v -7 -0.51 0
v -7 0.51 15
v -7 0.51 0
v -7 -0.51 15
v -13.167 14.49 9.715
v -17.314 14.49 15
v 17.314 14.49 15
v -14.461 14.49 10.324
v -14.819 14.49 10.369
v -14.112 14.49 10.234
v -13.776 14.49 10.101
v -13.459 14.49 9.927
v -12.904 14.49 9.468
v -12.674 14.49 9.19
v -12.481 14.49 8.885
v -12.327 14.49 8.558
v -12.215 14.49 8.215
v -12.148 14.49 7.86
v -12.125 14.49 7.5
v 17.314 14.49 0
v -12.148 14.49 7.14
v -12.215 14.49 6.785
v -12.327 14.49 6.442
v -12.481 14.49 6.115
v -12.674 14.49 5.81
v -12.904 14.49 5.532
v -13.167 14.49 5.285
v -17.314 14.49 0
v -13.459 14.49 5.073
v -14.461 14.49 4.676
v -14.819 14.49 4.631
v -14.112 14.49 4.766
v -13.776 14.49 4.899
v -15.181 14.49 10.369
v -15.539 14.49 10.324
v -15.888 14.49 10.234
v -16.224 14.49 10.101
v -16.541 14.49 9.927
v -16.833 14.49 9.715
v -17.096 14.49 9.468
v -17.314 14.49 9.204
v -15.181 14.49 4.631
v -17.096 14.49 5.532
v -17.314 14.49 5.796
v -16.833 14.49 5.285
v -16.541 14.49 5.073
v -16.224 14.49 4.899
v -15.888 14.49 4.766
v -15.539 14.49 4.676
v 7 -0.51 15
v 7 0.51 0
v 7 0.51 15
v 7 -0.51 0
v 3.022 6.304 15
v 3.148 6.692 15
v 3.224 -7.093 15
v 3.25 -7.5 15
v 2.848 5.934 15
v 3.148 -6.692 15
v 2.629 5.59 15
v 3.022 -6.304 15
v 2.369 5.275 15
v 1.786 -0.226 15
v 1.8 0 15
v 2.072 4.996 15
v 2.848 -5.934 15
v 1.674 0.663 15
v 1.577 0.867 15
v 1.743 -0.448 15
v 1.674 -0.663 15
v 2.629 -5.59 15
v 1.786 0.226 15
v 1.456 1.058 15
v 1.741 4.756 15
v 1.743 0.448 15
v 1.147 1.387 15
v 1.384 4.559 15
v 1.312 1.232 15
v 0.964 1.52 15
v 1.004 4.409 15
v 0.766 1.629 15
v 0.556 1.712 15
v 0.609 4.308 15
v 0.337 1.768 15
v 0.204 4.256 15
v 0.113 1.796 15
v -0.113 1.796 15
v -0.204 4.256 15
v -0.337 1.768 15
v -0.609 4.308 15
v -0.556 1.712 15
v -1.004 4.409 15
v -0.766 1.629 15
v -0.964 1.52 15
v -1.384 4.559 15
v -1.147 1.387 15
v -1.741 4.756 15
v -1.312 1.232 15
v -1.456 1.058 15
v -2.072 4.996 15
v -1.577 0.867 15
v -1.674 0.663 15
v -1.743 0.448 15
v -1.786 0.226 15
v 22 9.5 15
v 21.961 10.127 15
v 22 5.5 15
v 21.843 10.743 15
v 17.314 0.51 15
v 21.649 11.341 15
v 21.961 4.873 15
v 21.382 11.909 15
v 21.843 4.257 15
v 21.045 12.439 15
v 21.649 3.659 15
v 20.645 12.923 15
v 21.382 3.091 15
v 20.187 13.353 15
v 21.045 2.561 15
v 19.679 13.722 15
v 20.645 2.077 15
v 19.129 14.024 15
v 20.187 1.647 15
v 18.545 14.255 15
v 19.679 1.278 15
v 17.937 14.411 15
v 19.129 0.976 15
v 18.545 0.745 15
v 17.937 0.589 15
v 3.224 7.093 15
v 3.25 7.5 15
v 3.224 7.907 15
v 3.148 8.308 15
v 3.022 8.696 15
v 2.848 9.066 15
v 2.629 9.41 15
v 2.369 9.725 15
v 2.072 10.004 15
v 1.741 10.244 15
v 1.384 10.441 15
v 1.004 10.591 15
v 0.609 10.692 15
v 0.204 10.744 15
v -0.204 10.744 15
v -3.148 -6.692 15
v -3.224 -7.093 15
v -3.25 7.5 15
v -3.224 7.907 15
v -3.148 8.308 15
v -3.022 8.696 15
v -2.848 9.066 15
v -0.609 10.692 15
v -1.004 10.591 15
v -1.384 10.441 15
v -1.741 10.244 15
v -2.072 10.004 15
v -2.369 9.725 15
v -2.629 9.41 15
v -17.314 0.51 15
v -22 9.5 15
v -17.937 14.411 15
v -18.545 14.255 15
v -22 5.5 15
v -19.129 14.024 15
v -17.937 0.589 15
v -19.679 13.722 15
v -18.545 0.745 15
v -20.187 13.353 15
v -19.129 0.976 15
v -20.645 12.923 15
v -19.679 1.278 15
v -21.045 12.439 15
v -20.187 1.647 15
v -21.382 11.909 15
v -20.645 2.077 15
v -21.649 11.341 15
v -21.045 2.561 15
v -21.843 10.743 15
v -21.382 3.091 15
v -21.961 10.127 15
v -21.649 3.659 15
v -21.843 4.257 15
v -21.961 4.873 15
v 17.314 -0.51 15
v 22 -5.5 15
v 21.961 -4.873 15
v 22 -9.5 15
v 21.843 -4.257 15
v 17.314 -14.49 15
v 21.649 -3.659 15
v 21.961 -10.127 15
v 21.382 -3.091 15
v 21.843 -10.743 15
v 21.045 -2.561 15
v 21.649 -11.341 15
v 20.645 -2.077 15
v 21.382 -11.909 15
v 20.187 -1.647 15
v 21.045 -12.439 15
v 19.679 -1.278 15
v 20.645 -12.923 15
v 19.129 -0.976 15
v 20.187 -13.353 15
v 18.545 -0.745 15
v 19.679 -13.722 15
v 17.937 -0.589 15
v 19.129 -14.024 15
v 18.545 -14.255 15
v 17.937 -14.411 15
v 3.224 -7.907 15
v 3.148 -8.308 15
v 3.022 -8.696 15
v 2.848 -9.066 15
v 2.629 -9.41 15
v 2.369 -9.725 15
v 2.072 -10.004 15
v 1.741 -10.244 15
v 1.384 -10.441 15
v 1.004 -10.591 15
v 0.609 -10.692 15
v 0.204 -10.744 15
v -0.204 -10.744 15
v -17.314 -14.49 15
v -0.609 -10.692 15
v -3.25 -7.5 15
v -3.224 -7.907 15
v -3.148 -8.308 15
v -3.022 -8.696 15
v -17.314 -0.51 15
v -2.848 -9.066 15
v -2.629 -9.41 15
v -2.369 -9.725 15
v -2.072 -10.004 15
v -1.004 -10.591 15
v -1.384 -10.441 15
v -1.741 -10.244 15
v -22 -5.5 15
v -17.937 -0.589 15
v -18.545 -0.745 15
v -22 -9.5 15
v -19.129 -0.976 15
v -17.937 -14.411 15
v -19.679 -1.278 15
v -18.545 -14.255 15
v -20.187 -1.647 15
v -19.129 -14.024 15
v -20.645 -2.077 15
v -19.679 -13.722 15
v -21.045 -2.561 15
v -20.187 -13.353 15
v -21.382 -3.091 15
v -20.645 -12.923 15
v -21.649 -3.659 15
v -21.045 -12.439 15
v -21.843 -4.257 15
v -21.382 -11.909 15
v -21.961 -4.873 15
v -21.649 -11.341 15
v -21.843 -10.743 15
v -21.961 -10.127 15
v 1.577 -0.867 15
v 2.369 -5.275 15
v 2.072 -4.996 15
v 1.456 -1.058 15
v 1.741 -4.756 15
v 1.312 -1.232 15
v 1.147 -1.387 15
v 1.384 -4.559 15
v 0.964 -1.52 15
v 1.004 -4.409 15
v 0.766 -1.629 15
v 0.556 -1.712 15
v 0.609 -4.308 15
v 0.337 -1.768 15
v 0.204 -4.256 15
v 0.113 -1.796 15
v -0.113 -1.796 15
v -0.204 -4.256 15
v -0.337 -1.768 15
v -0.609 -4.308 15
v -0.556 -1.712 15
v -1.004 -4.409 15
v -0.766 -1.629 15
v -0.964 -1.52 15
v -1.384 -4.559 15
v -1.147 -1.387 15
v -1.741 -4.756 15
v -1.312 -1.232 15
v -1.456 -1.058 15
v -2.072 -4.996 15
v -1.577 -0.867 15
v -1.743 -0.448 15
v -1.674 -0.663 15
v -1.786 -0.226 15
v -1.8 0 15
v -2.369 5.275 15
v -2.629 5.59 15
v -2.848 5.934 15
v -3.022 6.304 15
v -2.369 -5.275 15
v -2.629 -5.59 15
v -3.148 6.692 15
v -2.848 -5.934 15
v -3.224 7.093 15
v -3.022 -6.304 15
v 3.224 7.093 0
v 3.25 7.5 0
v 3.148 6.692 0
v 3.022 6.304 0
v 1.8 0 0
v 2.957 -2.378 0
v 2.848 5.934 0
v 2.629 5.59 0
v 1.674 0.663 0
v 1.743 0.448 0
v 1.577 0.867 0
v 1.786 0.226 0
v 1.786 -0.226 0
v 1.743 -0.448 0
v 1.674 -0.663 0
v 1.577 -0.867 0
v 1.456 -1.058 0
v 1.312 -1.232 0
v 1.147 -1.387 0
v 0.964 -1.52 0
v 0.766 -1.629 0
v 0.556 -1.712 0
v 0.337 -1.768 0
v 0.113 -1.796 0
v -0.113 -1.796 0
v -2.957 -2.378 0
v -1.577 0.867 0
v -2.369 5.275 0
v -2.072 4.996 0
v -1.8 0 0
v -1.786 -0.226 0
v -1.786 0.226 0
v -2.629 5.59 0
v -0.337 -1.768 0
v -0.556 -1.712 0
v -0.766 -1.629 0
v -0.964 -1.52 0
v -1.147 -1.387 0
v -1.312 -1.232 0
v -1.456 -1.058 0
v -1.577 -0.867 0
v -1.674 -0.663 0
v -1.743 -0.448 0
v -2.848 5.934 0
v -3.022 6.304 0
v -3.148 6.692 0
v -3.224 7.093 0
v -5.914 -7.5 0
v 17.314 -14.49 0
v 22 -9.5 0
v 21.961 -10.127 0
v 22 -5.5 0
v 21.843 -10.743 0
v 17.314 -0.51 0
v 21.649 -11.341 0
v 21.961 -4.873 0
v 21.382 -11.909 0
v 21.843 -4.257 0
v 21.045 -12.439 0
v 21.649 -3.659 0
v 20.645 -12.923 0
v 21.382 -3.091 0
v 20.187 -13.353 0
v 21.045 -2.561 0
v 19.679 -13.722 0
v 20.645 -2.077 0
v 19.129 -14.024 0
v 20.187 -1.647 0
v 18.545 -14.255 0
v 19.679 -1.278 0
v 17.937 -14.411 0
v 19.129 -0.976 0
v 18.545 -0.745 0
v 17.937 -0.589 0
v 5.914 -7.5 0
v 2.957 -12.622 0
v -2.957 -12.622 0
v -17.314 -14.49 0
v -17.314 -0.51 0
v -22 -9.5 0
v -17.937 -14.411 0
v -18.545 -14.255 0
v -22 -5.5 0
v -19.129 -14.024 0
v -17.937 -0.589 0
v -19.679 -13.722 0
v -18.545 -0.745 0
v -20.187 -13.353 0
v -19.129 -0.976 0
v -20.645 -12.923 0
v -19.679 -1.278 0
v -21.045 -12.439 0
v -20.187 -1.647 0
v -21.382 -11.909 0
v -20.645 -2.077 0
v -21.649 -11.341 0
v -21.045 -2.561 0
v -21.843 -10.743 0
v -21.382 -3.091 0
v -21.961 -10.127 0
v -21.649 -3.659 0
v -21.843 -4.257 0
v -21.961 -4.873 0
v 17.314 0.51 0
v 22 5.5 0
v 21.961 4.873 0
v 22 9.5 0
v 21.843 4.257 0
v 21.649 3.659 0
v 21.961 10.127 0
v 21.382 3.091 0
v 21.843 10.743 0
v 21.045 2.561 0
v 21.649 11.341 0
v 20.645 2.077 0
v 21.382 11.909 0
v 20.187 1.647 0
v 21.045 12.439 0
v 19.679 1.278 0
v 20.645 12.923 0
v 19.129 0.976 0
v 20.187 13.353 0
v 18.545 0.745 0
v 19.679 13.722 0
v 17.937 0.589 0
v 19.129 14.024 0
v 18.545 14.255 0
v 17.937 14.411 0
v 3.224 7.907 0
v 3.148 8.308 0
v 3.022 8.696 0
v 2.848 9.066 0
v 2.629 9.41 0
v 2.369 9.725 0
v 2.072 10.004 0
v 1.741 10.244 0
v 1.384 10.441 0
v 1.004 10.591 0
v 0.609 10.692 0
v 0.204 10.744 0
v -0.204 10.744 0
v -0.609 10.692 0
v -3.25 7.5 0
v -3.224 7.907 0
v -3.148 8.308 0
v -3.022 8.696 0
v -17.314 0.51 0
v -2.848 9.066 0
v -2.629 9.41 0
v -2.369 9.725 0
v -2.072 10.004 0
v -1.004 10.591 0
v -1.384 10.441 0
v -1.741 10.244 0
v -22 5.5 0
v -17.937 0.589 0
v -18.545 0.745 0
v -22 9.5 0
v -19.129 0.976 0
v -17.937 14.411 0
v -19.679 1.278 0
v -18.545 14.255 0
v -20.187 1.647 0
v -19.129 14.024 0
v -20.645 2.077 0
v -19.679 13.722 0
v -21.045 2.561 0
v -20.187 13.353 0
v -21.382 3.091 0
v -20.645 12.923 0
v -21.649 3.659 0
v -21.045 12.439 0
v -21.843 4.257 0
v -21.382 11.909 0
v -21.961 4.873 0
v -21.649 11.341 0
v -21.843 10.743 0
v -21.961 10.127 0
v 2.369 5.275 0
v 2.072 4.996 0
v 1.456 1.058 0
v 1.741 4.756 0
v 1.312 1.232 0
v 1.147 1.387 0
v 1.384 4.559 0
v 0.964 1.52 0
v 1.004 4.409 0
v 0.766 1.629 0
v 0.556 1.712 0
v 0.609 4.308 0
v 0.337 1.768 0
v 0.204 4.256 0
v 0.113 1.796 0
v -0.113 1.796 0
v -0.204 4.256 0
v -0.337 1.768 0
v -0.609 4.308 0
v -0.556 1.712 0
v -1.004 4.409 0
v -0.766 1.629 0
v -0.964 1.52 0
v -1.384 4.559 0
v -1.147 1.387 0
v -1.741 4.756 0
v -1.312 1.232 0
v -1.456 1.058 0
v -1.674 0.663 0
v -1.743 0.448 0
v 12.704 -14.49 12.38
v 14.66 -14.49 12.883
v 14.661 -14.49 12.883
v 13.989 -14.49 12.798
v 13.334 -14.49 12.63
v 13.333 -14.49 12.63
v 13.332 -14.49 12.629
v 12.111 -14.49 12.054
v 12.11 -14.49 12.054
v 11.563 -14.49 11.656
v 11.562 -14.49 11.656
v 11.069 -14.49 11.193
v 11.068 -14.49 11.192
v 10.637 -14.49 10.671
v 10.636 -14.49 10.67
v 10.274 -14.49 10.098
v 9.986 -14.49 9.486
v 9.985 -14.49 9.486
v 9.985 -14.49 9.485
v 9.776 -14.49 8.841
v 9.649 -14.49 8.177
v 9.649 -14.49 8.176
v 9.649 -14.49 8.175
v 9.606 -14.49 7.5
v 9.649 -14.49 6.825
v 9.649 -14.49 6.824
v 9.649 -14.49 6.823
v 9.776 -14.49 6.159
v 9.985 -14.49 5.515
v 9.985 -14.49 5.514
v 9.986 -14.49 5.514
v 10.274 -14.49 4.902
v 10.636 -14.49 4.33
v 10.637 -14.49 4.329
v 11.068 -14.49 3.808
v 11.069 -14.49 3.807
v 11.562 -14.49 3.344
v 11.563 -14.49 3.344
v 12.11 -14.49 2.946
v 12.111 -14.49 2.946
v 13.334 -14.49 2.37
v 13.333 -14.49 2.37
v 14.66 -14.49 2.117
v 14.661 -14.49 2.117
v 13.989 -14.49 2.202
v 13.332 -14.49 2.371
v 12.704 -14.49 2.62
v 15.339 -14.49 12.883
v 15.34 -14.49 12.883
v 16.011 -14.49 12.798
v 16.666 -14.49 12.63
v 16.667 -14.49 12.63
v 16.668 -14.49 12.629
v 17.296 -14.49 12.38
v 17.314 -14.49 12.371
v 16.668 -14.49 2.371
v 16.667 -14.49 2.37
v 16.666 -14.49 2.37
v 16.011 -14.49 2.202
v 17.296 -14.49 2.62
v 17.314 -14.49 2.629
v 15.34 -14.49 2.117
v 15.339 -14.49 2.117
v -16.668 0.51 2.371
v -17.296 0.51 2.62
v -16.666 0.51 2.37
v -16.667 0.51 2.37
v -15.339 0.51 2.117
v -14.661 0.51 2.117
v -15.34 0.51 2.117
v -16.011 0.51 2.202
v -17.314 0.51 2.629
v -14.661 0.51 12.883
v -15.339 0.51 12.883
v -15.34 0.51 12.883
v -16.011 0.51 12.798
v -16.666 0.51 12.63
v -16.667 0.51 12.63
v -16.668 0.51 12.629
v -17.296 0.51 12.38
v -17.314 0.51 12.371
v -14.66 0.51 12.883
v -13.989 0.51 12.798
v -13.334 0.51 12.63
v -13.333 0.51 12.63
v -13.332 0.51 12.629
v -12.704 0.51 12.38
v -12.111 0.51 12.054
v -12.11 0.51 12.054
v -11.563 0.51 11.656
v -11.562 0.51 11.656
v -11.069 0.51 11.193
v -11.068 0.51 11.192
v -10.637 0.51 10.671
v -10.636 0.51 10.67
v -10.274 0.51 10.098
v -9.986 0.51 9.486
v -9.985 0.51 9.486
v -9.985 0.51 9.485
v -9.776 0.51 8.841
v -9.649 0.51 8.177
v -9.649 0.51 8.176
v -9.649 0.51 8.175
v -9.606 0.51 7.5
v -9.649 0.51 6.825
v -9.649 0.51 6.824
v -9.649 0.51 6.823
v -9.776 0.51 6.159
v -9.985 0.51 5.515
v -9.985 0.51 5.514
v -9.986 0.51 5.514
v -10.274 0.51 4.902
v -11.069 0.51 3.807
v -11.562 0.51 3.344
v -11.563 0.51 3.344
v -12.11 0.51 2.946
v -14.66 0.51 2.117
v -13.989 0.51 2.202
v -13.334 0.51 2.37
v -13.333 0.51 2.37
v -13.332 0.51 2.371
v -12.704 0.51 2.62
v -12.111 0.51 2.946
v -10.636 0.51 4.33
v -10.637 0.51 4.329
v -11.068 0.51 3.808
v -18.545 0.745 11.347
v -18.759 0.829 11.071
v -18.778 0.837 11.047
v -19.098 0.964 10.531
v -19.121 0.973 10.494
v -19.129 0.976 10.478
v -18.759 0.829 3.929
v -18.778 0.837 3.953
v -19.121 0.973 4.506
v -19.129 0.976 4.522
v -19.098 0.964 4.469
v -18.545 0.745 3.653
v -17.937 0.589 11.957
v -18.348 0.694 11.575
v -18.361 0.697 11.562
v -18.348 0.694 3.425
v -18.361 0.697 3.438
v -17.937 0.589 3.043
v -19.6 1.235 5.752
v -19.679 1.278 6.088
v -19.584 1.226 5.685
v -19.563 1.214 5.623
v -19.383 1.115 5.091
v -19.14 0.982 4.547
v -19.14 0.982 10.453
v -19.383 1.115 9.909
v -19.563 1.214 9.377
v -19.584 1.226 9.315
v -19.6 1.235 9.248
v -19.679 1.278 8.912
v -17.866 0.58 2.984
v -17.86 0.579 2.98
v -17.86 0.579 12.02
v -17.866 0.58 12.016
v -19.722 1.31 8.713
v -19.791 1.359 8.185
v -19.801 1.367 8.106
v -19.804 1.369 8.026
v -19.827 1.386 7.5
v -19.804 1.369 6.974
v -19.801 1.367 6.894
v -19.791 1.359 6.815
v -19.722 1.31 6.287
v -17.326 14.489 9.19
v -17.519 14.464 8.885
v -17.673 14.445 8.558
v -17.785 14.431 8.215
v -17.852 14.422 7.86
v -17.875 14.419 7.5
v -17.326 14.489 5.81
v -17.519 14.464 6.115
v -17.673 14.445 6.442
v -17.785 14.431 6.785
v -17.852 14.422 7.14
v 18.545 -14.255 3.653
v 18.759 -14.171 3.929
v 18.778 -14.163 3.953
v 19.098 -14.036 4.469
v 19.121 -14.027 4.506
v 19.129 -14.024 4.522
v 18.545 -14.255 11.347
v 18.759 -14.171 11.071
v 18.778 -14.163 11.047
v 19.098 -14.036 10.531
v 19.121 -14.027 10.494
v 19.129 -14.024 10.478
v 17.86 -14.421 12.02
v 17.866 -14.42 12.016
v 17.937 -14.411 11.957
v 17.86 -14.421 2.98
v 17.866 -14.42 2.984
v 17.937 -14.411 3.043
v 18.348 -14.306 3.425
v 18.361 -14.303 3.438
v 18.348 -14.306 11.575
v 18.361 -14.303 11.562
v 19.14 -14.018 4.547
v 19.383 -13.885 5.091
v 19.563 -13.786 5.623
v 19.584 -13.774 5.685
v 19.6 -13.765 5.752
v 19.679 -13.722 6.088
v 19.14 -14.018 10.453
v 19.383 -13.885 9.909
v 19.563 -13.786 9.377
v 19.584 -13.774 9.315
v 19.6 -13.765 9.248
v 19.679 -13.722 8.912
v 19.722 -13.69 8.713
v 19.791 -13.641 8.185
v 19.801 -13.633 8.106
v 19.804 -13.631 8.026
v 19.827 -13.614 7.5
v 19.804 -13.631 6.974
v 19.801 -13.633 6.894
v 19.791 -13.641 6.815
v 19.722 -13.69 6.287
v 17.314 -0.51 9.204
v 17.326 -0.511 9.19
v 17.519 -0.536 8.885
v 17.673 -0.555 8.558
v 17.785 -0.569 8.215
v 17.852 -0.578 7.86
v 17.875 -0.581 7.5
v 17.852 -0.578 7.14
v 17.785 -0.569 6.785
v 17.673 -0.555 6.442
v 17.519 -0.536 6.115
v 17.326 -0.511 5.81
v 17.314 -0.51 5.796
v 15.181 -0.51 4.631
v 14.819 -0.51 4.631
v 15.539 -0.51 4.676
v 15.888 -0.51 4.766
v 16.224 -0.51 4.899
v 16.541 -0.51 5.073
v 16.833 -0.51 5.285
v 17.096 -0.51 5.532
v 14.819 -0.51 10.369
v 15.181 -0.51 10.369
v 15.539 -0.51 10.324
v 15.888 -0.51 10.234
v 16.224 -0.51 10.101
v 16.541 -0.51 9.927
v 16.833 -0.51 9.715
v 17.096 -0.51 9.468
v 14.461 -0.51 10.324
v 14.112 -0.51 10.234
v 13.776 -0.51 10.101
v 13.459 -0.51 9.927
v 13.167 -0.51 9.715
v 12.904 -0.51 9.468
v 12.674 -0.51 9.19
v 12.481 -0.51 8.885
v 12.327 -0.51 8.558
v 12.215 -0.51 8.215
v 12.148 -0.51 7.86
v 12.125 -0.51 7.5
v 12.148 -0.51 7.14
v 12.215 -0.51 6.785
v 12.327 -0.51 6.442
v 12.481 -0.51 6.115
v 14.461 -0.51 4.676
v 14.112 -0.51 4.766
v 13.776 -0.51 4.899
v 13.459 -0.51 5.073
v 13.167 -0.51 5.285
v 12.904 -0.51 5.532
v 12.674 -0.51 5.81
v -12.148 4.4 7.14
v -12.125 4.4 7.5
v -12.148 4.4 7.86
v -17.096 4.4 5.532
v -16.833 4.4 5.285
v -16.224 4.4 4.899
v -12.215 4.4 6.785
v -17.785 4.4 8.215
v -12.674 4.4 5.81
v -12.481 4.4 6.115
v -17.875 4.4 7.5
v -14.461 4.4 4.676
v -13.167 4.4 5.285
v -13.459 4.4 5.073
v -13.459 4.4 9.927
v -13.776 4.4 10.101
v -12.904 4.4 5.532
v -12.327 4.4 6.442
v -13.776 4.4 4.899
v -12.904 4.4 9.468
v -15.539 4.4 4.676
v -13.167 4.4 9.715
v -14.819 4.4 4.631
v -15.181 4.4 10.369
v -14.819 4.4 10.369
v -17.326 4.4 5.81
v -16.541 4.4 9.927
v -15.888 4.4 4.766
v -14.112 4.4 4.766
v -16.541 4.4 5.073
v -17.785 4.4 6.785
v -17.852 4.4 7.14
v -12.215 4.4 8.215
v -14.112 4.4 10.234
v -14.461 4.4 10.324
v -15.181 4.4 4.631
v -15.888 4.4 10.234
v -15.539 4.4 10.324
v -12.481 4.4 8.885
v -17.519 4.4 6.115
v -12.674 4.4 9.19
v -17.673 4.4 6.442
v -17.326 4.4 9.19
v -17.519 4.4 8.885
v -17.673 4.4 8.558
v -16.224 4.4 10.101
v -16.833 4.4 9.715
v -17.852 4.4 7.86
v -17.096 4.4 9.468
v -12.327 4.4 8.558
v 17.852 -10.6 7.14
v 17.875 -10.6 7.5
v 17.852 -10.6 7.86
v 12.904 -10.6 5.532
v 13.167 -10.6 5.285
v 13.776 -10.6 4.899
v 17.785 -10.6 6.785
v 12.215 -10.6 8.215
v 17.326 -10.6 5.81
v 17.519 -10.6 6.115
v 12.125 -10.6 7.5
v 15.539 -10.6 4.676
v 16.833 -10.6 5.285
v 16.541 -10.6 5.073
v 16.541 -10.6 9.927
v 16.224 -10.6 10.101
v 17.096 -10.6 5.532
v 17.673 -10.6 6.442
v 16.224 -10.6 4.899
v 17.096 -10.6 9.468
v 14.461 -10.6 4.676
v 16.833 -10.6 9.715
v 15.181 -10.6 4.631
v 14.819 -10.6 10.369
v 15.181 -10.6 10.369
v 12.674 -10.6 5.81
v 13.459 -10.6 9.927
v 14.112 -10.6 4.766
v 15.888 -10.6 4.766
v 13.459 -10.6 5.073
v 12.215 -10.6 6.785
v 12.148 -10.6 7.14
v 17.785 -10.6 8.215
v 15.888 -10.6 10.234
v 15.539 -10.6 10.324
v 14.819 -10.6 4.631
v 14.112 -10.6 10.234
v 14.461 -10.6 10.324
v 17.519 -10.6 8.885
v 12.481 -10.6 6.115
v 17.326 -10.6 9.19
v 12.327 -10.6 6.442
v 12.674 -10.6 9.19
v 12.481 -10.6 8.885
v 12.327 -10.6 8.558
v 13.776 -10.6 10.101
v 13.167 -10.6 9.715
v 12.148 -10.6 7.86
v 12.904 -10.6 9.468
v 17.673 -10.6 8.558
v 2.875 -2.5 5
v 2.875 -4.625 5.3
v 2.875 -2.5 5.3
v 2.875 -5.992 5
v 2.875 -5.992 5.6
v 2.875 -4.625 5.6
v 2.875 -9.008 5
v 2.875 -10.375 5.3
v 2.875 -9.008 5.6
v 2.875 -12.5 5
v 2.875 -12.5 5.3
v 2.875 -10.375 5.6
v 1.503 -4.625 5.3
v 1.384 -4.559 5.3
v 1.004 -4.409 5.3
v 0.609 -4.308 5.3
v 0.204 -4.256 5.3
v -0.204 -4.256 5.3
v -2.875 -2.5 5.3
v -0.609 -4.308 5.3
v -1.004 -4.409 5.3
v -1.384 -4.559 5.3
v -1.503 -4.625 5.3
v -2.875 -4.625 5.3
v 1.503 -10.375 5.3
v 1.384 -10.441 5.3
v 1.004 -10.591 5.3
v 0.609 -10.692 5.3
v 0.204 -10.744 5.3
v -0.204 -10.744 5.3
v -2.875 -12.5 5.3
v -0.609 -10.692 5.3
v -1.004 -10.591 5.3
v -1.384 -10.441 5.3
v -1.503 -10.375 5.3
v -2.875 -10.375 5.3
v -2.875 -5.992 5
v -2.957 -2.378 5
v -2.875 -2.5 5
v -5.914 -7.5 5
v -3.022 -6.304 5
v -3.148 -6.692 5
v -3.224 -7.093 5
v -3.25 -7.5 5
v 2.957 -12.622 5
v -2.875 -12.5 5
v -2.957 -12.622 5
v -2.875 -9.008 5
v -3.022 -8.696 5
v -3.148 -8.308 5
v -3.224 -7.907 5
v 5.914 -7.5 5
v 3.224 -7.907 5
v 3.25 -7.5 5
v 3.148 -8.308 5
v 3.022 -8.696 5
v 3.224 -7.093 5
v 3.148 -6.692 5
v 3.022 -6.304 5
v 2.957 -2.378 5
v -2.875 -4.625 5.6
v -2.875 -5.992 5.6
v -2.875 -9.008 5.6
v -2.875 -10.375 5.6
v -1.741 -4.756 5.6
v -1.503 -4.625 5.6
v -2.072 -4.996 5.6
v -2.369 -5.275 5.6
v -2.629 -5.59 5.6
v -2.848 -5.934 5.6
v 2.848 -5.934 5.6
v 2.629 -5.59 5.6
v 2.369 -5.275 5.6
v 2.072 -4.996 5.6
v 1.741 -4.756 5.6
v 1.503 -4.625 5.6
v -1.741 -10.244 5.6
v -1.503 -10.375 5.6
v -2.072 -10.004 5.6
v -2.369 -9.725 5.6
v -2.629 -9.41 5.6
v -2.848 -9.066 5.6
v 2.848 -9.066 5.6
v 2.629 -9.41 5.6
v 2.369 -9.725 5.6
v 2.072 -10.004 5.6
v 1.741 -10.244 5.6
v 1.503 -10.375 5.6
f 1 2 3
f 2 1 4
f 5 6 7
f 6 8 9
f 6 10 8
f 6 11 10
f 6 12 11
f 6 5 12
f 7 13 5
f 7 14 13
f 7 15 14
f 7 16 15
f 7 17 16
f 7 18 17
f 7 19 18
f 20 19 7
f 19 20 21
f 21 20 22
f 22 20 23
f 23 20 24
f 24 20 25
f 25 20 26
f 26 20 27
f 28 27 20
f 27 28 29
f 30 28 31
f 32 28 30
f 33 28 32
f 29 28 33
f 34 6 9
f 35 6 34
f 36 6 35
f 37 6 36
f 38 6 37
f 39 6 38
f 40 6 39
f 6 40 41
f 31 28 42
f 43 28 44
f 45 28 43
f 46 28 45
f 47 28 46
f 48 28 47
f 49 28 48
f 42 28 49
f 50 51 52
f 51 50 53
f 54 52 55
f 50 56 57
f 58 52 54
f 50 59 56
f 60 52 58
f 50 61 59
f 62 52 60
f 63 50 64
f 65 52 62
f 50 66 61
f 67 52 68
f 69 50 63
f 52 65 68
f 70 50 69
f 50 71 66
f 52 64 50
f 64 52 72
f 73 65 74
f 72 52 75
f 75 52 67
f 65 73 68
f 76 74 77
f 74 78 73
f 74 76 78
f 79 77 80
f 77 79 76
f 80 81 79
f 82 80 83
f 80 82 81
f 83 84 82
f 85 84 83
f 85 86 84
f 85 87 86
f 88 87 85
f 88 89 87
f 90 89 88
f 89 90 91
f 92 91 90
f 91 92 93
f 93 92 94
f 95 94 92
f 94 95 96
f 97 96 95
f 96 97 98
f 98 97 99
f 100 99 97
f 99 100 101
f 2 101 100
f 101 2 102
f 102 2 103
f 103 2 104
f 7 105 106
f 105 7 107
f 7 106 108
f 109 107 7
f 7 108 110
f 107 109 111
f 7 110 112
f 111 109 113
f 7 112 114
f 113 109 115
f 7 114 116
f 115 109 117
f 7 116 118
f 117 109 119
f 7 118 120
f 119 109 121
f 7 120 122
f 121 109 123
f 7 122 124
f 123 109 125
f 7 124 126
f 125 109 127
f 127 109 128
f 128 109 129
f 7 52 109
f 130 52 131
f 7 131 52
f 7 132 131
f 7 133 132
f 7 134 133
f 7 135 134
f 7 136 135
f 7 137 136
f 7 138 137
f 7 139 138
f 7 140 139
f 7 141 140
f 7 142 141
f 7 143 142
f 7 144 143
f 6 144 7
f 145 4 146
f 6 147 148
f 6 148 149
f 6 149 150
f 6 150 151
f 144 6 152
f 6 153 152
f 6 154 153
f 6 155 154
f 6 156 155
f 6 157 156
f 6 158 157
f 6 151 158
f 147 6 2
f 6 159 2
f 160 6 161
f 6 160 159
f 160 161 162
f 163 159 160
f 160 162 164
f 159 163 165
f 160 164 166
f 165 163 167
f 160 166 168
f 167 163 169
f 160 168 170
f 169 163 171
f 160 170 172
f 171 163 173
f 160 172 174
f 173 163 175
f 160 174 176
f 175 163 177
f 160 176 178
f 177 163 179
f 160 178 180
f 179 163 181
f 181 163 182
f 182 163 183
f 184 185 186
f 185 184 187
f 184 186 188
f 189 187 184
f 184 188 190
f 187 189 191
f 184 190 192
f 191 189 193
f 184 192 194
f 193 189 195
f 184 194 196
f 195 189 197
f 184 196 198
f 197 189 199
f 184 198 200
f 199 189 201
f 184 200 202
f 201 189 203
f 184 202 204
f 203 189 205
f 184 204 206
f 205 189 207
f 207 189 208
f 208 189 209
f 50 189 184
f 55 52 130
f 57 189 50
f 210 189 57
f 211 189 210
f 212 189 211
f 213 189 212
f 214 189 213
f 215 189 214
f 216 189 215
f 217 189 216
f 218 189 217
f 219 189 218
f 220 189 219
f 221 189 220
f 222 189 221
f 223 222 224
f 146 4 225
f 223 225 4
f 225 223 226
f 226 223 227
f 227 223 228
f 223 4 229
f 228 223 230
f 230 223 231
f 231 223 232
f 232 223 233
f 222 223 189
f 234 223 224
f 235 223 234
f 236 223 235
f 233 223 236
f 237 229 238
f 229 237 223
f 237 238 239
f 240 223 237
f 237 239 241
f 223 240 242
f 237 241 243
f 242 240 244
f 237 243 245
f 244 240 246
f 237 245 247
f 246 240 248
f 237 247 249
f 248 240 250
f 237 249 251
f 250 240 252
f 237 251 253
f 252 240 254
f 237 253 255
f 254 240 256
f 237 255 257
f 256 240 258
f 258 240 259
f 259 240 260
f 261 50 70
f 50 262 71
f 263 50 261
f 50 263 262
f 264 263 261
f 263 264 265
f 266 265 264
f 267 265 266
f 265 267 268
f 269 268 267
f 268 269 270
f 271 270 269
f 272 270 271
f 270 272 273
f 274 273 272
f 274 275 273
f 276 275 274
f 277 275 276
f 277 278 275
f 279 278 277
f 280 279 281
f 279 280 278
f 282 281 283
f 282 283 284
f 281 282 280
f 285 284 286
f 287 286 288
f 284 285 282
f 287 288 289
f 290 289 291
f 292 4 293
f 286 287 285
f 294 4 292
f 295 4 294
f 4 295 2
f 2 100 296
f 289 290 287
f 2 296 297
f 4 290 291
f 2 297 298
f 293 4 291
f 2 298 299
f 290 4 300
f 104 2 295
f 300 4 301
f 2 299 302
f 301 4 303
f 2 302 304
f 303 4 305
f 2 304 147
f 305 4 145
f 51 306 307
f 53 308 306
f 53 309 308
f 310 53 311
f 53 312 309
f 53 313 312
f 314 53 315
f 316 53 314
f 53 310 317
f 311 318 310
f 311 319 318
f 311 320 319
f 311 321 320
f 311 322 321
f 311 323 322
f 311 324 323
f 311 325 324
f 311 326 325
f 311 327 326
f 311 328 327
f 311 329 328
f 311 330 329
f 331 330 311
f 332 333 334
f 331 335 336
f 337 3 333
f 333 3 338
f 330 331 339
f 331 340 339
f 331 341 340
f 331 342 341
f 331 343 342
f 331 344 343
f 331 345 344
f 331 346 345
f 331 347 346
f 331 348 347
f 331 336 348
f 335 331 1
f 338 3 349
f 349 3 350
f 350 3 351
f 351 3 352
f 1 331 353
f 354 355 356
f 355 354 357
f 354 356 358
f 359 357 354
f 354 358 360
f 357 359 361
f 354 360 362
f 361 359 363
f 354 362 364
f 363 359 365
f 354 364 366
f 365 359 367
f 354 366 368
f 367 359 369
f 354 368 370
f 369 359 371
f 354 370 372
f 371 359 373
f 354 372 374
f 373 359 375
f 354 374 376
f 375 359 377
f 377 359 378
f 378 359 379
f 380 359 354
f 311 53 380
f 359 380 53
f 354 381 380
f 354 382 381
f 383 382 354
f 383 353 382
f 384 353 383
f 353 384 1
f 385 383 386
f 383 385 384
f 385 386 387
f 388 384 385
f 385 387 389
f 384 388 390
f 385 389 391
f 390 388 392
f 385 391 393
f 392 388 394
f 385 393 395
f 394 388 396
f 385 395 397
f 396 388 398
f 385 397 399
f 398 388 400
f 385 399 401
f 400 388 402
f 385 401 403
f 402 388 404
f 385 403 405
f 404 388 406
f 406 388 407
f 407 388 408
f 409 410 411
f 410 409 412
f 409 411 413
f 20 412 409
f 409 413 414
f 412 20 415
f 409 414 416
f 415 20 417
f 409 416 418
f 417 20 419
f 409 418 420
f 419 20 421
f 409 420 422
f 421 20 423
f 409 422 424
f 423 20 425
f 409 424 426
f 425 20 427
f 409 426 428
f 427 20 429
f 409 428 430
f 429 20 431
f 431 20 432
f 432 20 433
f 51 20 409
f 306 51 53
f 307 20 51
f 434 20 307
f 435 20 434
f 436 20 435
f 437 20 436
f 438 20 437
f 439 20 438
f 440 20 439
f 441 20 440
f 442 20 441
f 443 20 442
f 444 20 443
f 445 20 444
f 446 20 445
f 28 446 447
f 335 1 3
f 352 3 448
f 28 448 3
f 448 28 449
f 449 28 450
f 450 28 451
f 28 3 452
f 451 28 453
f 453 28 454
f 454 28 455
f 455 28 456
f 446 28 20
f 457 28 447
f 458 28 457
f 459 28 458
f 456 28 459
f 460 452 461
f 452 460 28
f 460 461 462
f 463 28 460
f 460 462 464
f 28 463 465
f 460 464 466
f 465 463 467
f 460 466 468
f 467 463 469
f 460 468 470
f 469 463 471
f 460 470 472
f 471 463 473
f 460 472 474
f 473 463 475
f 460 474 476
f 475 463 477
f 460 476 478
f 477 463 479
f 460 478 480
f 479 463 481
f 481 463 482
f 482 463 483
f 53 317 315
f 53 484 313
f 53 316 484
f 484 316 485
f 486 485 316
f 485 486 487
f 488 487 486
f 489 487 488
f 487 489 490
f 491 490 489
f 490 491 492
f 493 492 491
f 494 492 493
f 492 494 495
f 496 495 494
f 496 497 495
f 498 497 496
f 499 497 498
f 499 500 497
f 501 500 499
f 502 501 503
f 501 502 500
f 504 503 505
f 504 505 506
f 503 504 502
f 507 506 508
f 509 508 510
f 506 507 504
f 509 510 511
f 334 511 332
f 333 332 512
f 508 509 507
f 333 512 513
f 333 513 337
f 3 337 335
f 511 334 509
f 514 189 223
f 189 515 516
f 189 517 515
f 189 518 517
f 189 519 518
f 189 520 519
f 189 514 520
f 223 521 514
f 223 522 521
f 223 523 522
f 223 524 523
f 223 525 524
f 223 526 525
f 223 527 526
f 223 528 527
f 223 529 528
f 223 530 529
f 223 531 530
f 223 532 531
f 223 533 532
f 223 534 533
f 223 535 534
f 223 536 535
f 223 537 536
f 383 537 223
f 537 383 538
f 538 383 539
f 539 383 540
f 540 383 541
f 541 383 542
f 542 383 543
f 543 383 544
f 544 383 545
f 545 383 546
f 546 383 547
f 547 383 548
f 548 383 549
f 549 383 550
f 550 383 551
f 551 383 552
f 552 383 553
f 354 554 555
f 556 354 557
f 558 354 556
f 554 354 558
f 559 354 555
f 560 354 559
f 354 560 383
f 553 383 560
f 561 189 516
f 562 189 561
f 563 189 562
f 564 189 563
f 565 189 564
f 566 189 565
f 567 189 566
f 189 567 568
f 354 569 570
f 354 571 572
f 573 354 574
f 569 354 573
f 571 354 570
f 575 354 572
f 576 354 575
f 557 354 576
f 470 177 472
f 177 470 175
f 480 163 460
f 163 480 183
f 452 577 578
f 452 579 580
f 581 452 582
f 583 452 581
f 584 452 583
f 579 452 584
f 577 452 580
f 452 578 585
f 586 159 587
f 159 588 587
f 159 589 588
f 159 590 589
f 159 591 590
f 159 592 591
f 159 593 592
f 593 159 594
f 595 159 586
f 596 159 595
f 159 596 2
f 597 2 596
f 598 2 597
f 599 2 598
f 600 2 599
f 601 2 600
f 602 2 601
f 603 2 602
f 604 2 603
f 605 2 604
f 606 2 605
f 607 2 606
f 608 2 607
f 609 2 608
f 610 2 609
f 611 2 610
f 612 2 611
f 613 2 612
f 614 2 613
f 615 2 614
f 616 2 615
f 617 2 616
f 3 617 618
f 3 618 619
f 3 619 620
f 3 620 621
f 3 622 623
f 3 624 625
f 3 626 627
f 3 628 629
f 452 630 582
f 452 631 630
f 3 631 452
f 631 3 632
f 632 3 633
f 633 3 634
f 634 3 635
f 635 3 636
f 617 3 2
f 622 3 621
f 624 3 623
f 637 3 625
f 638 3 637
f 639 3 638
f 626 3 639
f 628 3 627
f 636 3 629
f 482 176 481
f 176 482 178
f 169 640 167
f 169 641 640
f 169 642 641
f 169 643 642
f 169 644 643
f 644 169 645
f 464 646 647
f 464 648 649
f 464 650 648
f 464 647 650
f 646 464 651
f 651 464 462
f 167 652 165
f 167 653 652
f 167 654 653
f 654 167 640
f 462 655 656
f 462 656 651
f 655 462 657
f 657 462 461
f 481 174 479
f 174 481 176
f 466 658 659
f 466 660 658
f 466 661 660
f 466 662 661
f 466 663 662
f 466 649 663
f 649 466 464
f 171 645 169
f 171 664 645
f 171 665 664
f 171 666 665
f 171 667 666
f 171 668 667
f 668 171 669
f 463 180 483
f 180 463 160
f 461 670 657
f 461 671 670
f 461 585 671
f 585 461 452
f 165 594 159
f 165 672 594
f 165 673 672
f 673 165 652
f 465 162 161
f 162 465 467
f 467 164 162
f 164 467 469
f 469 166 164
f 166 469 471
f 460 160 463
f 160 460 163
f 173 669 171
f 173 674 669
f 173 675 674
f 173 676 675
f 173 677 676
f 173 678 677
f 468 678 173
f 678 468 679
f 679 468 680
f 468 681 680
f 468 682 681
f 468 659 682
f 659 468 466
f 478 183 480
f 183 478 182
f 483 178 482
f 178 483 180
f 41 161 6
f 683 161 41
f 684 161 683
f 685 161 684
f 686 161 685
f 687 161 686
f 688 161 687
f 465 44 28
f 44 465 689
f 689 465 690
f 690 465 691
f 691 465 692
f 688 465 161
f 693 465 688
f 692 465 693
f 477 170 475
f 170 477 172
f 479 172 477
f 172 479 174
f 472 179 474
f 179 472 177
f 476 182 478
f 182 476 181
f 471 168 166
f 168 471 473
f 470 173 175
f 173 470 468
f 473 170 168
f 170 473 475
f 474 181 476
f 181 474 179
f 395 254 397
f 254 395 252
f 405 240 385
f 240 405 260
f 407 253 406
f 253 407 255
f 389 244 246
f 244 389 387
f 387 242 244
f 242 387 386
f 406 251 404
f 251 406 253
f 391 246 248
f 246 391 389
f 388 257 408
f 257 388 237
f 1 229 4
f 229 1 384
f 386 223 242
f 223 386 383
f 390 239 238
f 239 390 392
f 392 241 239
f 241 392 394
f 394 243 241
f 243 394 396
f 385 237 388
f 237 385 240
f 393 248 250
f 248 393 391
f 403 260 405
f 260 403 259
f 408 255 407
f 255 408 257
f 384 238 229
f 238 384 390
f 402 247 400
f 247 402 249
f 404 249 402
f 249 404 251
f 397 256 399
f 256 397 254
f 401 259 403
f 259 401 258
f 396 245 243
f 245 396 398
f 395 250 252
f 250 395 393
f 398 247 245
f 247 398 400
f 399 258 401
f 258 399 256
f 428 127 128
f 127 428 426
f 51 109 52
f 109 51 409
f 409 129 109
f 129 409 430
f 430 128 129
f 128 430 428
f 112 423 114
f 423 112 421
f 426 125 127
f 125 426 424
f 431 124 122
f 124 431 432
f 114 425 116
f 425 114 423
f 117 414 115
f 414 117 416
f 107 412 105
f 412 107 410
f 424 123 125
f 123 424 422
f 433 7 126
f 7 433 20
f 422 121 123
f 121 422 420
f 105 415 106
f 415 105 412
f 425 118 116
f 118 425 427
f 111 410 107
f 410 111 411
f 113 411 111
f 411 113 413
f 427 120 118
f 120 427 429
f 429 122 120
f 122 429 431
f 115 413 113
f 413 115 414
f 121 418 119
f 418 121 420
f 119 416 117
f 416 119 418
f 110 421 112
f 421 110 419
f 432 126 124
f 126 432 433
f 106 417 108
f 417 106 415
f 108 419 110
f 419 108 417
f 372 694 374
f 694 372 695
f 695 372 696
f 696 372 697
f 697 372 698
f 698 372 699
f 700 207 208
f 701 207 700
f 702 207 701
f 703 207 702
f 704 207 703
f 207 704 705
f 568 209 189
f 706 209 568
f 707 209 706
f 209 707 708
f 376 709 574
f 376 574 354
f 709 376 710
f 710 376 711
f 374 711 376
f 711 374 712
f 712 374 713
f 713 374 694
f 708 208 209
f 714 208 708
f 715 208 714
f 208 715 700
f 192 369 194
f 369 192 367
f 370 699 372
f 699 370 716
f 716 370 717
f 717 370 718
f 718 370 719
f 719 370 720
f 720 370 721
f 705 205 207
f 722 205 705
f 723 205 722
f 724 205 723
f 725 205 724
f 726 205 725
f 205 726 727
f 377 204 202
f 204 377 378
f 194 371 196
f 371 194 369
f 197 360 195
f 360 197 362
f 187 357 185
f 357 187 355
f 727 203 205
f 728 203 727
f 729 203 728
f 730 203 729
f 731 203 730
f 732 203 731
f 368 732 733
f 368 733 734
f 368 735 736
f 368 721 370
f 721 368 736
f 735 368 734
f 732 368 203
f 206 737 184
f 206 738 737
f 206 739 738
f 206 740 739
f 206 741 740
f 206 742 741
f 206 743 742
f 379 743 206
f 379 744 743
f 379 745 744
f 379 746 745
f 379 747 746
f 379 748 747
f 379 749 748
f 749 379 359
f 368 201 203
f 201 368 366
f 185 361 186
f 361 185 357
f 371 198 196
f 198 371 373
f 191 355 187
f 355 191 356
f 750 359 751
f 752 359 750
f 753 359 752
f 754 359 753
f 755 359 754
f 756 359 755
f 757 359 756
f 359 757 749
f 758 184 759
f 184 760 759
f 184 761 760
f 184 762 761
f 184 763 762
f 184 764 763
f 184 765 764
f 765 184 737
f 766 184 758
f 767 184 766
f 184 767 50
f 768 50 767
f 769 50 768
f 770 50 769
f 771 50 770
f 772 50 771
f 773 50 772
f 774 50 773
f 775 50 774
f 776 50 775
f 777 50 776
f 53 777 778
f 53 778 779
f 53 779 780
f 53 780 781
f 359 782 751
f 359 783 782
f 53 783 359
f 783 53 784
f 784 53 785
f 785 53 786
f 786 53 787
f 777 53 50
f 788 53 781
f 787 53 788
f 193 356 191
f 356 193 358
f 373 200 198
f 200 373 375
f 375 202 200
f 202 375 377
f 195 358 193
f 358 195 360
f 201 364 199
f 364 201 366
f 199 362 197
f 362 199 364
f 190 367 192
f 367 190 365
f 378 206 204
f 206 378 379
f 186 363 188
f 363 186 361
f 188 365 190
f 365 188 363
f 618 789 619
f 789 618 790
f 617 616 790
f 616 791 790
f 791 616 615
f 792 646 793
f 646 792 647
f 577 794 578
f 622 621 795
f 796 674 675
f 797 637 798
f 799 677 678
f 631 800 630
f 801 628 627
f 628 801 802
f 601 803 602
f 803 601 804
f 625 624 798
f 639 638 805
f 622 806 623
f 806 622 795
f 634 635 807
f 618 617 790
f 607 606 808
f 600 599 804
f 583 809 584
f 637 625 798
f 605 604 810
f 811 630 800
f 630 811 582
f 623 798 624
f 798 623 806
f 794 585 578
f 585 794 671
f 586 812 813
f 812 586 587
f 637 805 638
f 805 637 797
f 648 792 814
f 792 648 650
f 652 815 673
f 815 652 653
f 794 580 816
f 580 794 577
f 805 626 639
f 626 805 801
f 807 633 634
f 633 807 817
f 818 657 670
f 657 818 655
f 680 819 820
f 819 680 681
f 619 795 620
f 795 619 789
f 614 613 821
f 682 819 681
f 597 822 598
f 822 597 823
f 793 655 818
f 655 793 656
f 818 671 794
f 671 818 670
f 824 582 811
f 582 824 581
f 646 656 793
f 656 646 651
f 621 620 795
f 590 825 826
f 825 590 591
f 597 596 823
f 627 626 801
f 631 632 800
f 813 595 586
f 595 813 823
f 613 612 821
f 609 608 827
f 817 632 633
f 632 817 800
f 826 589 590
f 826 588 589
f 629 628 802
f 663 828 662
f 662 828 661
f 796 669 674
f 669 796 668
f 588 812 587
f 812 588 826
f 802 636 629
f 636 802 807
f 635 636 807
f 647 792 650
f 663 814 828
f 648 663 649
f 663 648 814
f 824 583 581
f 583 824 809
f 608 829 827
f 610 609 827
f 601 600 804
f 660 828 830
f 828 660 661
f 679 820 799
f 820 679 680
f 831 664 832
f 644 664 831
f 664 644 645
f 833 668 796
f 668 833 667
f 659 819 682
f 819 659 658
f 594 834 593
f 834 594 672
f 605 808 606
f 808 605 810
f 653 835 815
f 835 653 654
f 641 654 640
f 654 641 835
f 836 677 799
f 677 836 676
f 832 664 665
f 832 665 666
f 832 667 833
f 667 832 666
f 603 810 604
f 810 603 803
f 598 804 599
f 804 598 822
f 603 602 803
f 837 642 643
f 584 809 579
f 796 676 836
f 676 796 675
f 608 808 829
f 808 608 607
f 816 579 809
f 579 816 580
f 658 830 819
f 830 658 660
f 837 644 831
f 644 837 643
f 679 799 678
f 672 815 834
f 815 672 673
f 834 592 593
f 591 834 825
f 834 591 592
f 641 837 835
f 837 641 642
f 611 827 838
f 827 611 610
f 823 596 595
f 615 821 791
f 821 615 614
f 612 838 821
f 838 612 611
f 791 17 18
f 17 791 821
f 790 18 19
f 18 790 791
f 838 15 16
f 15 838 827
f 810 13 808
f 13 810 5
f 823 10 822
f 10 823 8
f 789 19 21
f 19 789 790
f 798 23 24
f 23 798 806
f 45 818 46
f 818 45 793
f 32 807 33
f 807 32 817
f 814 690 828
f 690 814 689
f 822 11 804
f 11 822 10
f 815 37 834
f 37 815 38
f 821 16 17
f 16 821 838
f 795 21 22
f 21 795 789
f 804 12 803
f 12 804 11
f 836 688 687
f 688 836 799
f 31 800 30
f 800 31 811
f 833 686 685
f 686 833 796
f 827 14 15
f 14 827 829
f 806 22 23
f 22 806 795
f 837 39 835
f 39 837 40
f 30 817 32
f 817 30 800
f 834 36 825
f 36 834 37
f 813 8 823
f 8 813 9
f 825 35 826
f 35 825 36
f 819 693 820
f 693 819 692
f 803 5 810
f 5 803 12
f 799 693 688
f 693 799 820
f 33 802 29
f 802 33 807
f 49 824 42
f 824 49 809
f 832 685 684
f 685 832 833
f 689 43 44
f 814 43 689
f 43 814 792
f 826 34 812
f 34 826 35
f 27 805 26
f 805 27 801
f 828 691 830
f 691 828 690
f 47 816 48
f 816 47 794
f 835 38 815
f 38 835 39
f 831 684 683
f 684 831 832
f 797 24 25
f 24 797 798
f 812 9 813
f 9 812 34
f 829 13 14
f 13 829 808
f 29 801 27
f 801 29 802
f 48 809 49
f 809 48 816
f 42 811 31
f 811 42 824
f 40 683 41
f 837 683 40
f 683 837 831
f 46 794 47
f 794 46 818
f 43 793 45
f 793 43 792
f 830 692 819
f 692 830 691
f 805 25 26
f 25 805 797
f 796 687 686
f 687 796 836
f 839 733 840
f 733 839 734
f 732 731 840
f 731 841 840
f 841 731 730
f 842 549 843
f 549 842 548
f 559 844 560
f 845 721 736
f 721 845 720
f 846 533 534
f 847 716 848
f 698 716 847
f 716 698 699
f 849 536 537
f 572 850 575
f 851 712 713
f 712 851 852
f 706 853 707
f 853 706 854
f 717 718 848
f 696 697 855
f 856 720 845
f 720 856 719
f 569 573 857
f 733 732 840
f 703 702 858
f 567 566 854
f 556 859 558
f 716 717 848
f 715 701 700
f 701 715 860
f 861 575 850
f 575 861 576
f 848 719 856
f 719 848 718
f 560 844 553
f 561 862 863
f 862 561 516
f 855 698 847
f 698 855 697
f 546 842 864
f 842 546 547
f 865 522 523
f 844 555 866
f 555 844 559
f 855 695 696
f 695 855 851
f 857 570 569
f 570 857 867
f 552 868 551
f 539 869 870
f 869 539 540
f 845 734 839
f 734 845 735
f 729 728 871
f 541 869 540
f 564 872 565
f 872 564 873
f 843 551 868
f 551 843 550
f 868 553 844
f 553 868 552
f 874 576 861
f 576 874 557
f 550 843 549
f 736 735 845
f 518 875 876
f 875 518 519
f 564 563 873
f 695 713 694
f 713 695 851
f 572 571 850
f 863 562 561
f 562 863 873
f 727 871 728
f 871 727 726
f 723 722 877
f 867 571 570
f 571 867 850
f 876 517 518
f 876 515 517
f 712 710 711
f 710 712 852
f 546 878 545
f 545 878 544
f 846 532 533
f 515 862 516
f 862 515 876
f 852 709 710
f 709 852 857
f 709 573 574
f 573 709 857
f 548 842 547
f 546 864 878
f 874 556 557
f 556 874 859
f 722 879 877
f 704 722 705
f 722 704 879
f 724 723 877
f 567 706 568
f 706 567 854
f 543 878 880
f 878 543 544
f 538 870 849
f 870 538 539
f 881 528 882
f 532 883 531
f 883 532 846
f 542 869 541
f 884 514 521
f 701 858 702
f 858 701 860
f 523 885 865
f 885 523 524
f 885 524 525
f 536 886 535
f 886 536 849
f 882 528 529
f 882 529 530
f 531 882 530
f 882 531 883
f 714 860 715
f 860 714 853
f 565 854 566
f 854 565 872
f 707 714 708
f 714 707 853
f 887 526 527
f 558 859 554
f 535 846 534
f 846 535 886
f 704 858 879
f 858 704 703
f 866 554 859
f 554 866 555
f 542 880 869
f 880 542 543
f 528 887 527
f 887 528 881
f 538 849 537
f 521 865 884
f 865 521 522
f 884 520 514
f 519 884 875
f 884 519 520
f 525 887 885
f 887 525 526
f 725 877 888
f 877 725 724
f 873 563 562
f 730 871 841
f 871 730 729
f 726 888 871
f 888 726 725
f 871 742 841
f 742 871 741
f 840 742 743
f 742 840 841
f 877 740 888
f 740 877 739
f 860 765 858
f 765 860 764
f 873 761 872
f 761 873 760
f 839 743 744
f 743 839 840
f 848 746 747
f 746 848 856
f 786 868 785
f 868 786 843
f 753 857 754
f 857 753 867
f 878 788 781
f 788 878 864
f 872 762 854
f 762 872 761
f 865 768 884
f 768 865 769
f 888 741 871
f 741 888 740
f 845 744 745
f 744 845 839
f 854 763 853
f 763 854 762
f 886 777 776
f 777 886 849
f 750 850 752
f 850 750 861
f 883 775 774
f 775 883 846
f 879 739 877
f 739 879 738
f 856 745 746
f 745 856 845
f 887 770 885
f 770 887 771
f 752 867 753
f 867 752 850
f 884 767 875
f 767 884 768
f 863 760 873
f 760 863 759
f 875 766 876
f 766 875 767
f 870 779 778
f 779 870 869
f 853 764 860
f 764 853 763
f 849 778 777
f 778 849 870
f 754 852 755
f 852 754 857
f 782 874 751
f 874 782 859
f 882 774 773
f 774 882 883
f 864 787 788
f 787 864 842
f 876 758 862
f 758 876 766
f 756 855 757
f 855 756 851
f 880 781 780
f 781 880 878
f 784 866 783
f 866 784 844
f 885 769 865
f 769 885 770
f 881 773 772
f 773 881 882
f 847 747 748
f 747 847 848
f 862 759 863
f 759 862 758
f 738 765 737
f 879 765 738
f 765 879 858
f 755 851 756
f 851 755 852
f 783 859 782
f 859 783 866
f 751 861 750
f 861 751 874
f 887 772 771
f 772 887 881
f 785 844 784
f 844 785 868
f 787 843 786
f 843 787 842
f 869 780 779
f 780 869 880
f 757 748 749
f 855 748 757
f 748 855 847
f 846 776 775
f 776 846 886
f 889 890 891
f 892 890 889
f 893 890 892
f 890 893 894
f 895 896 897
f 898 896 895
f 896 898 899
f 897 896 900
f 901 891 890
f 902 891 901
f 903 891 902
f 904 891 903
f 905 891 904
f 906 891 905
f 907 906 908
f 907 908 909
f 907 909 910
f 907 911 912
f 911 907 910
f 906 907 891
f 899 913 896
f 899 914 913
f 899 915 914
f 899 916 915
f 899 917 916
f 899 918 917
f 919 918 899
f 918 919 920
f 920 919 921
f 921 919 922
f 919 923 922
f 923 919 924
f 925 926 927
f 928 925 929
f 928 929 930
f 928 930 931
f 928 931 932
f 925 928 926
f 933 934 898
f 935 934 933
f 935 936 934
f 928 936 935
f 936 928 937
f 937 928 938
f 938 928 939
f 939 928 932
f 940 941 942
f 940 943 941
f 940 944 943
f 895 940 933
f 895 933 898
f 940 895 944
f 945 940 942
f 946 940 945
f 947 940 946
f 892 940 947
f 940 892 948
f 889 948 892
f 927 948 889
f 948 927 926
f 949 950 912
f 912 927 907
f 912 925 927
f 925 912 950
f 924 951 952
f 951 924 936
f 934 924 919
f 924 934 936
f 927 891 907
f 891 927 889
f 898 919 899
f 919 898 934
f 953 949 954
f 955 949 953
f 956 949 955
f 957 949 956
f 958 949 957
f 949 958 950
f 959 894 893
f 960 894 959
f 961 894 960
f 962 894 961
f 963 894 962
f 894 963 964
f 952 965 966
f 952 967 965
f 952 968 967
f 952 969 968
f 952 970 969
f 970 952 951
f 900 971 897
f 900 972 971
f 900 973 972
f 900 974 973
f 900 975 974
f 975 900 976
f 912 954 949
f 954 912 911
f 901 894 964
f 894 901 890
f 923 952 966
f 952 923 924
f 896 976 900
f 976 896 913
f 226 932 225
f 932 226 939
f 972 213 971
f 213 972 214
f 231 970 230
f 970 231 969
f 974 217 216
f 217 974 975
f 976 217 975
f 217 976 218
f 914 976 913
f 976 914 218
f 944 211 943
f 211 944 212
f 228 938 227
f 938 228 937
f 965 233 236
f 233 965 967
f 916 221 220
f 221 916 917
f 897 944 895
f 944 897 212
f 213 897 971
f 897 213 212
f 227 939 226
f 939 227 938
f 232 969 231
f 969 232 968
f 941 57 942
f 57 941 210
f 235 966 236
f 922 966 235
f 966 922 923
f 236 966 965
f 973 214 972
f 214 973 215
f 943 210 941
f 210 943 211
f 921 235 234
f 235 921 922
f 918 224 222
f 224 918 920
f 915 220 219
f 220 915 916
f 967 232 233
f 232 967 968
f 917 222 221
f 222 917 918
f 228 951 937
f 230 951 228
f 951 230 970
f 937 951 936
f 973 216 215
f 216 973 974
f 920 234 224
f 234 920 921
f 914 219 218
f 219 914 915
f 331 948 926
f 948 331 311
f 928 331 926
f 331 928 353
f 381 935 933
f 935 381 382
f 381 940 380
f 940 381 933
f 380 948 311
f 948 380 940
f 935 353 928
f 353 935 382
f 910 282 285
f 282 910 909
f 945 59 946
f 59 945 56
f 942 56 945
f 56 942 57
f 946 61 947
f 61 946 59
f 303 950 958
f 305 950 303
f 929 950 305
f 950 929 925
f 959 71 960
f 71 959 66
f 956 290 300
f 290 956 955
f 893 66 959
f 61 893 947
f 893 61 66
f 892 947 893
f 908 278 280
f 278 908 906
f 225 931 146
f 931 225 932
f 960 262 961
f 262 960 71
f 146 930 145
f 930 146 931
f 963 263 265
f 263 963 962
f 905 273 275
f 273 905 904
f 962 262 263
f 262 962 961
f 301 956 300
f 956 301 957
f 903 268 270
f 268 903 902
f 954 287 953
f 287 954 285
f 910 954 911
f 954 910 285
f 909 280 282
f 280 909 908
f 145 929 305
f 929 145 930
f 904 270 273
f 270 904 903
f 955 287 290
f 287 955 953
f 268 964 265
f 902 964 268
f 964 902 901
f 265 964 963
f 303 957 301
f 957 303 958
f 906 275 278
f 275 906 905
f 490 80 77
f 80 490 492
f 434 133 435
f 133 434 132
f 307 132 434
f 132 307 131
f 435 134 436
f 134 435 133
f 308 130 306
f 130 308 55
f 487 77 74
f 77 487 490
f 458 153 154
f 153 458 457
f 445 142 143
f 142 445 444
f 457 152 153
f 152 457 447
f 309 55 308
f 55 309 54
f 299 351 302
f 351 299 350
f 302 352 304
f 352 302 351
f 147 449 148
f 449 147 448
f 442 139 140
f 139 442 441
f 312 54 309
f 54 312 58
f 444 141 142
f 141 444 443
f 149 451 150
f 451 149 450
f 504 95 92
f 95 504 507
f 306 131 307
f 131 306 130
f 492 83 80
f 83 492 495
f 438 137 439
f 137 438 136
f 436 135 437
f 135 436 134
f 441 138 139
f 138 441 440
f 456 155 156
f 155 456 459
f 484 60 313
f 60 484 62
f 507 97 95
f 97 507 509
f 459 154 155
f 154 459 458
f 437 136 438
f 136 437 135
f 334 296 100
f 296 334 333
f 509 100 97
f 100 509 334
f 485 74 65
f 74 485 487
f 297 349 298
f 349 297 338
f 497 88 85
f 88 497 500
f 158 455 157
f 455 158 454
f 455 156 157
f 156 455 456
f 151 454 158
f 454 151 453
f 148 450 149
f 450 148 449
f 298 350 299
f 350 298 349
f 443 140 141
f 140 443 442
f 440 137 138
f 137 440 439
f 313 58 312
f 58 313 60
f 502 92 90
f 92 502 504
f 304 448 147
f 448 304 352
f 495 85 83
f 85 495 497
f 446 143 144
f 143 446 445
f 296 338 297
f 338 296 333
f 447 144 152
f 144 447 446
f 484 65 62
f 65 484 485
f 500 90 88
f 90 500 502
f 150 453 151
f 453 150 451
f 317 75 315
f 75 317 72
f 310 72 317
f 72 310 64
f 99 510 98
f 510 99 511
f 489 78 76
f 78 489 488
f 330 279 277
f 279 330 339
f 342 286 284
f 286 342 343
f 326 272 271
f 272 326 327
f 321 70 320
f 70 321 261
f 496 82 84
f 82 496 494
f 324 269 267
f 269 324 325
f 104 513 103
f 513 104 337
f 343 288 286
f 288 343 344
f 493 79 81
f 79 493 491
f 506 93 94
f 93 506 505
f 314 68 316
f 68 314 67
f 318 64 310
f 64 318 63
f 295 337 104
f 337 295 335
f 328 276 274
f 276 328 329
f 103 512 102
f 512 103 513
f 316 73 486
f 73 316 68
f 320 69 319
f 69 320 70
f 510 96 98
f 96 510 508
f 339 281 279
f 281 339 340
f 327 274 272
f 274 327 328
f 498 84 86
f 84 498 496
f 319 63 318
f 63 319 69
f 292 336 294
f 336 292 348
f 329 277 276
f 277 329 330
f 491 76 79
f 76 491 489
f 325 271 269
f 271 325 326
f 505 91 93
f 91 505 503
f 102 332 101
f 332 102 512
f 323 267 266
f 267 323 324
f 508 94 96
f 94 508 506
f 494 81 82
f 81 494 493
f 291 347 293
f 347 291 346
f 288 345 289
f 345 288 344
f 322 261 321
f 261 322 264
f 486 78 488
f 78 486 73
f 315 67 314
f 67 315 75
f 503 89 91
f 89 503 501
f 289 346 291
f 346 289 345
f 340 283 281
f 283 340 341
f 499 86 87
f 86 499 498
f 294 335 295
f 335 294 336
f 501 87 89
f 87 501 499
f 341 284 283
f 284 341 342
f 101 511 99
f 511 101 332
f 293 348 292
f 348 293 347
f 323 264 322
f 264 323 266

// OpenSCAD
$fn = 50;


difference() {
	union() {
		hull() {
			translate(v = [-2.0000000000, 9.5000000000, 0]) {
				cylinder(h = 15, r = 5);
			}
			translate(v = [2.0000000000, 9.5000000000, 0]) {
				cylinder(h = 15, r = 5);
			}
			translate(v = [-2.0000000000, -9.5000000000, 0]) {
				cylinder(h = 15, r = 5);
			}
			translate(v = [2.0000000000, -9.5000000000, 0]) {
				cylinder(h = 15, r = 5);
			}
		}
		translate(v = [-7.5000000000, 7.5000000000, 0]) {
			hull() {
				translate(v = [-9.5000000000, 2.0000000000, 0]) {
					cylinder(h = 15, r = 5);
				}
				translate(v = [9.5000000000, 2.0000000000, 0]) {
					cylinder(h = 15, r = 5);
				}
				translate(v = [-9.5000000000, -2.0000000000, 0]) {
					cylinder(h = 15, r = 5);
				}
				translate(v = [9.5000000000, -2.0000000000, 0]) {
					cylinder(h = 15, r = 5);
				}
			}
		}
		translate(v = [-7.5000000000, -7.5000000000, 0]) {
			hull() {
				translate(v = [-9.5000000000, 2.0000000000, 0]) {
					cylinder(h = 15, r = 5);
				}
				translate(v = [9.5000000000, 2.0000000000, 0]) {
					cylinder(h = 15, r = 5);
				}
				translate(v = [-9.5000000000, -2.0000000000, 0]) {
					cylinder(h = 15, r = 5);
				}
				translate(v = [9.5000000000, -2.0000000000, 0]) {
					cylinder(h = 15, r = 5);
				}
			}
		}
		translate(v = [7.5000000000, 7.5000000000, 0]) {
			hull() {
				translate(v = [-9.5000000000, 2.0000000000, 0]) {
					cylinder(h = 15, r = 5);
				}
				translate(v = [9.5000000000, 2.0000000000, 0]) {
					cylinder(h = 15, r = 5);
				}
				translate(v = [-9.5000000000, -2.0000000000, 0]) {
					cylinder(h = 15, r = 5);
				}
				translate(v = [9.5000000000, -2.0000000000, 0]) {
					cylinder(h = 15, r = 5);
				}
			}
		}
		translate(v = [7.5000000000, -7.5000000000, 0]) {
			hull() {
				translate(v = [-9.5000000000, 2.0000000000, 0]) {
					cylinder(h = 15, r = 5);
				}
				translate(v = [9.5000000000, 2.0000000000, 0]) {
					cylinder(h = 15, r = 5);
				}
				translate(v = [-9.5000000000, -2.0000000000, 0]) {
					cylinder(h = 15, r = 5);
				}
				translate(v = [9.5000000000, -2.0000000000, 0]) {
					cylinder(h = 15, r = 5);
				}
			}
		}
	}
	union() {
		translate(v = [-15.0000000000, 0.5000000000, 7.5000000000]) {
			rotate(a = [90, 0, 0]) {
				difference() {
					union() {
						#translate(v = [0, 0, -14.0000000000]) {
							cylinder(h = 14, r = 2.6000000000);
						}
						#translate(v = [0, 0, -3.9000000000]) {
							cylinder(h = 3.9000000000, r1 = 2.8750000000, r2 = 5.4000000000);
						}
						#translate(v = [0, 0, -14.0000000000]) {
							cylinder(h = 14, r = 2.8750000000);
						}
						#translate(v = [0, 0, -14.0000000000]) {
							cylinder(h = 14, r = 2.6000000000);
						}
					}
					union();
				}
			}
		}
		translate(v = [15.0000000000, -14.5000000000, 7.5000000000]) {
			rotate(a = [90, 0, 0]) {
				difference() {
					union() {
						#translate(v = [0, 0, -14.0000000000]) {
							cylinder(h = 14, r = 2.6000000000);
						}
						#translate(v = [0, 0, -3.9000000000]) {
							cylinder(h = 3.9000000000, r1 = 2.8750000000, r2 = 5.4000000000);
						}
						#translate(v = [0, 0, -14.0000000000]) {
							cylinder(h = 14, r = 2.8750000000);
						}
						#translate(v = [0, 0, -14.0000000000]) {
							cylinder(h = 14, r = 2.6000000000);
						}
					}
					union();
				}
			}
		}
		translate(v = [0.0000000000, -7.5000000000, 0]) {
			rotate(a = [0, 0, 0]) {
				difference() {
					union() {
						#translate(v = [-2.8750000000, -5.0000000000, -0.3000000000]) {
							cube(size = [5.7500000000, 10, 0.3000000000]);
						}
						#translate(v = [-2.8750000000, -2.8750000000, -0.6000000000]) {
							cube(size = [5.7500000000, 5.7500000000, 0.3000000000]);
						}
						#translate(v = [-2.8750000000, -5.0000000000, 5]) {
							cube(size = [5.7500000000, 10, 0.3000000000]);
						}
						#translate(v = [-2.8750000000, -2.8750000000, 5.3000000000]) {
							cube(size = [5.7500000000, 5.7500000000, 0.3000000000]);
						}
						#translate(v = [0, 0, -100.0000000000]) {
							cylinder(h = 200, r = 3.2500000000);
						}
						#linear_extrude(height = 5) {
							polygon(points = [[5.9142500000, 0.0000000000], [2.9571250000, 5.1218907443], [-2.9571250000, 5.1218907443], [-5.9142500000, 0.0000000000], [-2.9571250000, -5.1218907443], [2.9571250000, -5.1218907443]]);
						}
						#translate(v = [-2.8750000000, -5.0000000000, -0.3000000000]) {
							cube(size = [5.7500000000, 10, 0.3000000000]);
						}
						#translate(v = [-2.8750000000, -2.8750000000, -0.6000000000]) {
							cube(size = [5.7500000000, 5.7500000000, 0.3000000000]);
						}
						#translate(v = [-2.8750000000, -5.0000000000, 5]) {
							cube(size = [5.7500000000, 10, 0.3000000000]);
						}
						#translate(v = [-2.8750000000, -2.8750000000, 5.3000000000]) {
							cube(size = [5.7500000000, 5.7500000000, 0.3000000000]);
						}
						#translate(v = [0, 0, -100.0000000000]) {
							cylinder(h = 200, r = 3.2500000000);
						}
						#translate(v = [-2.8750000000, -5.0000000000, -0.3000000000]) {
							cube(size = [5.7500000000, 10, 0.3000000000]);
						}
						#translate(v = [-2.8750000000, -2.8750000000, -0.6000000000]) {
							cube(size = [5.7500000000, 5.7500000000, 0.3000000000]);
						}
						#translate(v = [-2.8750000000, -5.0000000000, 5]) {
							cube(size = [5.7500000000, 10, 0.3000000000]);
						}
						#translate(v = [-2.8750000000, -2.8750000000, 5.3000000000]) {
							cube(size = [5.7500000000, 5.7500000000, 0.3000000000]);
						}
						#translate(v = [0, 0, -100.0000000000]) {
							cylinder(h = 200, r = 3.2500000000);
						}
					}
					union();
				}
			}
		}
		translate(v = [0.0000000000, -7.5000000000, 0]) {
			translate(v = [0, 0, -100]) {
				cylinder(h = 200, r = 3.2500000000);
			}
		}
		translate(v = [0.0000000000, 7.5000000000, 0]) {
			translate(v = [0, 0, -100]) {
				cylinder(h = 200, r = 3.2500000000);
			}
		}
		translate(v = [0.0000000000, -7.5000000000, 0]) {
			translate(v = [0, 0, -100]) {
				cylinder(h = 200, r = 1.8000000000);
			}
		}
		translate(v = [0, 0, -100]) {
			cylinder(h = 200, r = 1.8000000000);
		}
		translate(v = [0.0000000000, 7.5000000000, 0]) {
			translate(v = [0, 0, -100]) {
				cylinder(h = 200, r = 1.8000000000);
			}
		}
	}
}
